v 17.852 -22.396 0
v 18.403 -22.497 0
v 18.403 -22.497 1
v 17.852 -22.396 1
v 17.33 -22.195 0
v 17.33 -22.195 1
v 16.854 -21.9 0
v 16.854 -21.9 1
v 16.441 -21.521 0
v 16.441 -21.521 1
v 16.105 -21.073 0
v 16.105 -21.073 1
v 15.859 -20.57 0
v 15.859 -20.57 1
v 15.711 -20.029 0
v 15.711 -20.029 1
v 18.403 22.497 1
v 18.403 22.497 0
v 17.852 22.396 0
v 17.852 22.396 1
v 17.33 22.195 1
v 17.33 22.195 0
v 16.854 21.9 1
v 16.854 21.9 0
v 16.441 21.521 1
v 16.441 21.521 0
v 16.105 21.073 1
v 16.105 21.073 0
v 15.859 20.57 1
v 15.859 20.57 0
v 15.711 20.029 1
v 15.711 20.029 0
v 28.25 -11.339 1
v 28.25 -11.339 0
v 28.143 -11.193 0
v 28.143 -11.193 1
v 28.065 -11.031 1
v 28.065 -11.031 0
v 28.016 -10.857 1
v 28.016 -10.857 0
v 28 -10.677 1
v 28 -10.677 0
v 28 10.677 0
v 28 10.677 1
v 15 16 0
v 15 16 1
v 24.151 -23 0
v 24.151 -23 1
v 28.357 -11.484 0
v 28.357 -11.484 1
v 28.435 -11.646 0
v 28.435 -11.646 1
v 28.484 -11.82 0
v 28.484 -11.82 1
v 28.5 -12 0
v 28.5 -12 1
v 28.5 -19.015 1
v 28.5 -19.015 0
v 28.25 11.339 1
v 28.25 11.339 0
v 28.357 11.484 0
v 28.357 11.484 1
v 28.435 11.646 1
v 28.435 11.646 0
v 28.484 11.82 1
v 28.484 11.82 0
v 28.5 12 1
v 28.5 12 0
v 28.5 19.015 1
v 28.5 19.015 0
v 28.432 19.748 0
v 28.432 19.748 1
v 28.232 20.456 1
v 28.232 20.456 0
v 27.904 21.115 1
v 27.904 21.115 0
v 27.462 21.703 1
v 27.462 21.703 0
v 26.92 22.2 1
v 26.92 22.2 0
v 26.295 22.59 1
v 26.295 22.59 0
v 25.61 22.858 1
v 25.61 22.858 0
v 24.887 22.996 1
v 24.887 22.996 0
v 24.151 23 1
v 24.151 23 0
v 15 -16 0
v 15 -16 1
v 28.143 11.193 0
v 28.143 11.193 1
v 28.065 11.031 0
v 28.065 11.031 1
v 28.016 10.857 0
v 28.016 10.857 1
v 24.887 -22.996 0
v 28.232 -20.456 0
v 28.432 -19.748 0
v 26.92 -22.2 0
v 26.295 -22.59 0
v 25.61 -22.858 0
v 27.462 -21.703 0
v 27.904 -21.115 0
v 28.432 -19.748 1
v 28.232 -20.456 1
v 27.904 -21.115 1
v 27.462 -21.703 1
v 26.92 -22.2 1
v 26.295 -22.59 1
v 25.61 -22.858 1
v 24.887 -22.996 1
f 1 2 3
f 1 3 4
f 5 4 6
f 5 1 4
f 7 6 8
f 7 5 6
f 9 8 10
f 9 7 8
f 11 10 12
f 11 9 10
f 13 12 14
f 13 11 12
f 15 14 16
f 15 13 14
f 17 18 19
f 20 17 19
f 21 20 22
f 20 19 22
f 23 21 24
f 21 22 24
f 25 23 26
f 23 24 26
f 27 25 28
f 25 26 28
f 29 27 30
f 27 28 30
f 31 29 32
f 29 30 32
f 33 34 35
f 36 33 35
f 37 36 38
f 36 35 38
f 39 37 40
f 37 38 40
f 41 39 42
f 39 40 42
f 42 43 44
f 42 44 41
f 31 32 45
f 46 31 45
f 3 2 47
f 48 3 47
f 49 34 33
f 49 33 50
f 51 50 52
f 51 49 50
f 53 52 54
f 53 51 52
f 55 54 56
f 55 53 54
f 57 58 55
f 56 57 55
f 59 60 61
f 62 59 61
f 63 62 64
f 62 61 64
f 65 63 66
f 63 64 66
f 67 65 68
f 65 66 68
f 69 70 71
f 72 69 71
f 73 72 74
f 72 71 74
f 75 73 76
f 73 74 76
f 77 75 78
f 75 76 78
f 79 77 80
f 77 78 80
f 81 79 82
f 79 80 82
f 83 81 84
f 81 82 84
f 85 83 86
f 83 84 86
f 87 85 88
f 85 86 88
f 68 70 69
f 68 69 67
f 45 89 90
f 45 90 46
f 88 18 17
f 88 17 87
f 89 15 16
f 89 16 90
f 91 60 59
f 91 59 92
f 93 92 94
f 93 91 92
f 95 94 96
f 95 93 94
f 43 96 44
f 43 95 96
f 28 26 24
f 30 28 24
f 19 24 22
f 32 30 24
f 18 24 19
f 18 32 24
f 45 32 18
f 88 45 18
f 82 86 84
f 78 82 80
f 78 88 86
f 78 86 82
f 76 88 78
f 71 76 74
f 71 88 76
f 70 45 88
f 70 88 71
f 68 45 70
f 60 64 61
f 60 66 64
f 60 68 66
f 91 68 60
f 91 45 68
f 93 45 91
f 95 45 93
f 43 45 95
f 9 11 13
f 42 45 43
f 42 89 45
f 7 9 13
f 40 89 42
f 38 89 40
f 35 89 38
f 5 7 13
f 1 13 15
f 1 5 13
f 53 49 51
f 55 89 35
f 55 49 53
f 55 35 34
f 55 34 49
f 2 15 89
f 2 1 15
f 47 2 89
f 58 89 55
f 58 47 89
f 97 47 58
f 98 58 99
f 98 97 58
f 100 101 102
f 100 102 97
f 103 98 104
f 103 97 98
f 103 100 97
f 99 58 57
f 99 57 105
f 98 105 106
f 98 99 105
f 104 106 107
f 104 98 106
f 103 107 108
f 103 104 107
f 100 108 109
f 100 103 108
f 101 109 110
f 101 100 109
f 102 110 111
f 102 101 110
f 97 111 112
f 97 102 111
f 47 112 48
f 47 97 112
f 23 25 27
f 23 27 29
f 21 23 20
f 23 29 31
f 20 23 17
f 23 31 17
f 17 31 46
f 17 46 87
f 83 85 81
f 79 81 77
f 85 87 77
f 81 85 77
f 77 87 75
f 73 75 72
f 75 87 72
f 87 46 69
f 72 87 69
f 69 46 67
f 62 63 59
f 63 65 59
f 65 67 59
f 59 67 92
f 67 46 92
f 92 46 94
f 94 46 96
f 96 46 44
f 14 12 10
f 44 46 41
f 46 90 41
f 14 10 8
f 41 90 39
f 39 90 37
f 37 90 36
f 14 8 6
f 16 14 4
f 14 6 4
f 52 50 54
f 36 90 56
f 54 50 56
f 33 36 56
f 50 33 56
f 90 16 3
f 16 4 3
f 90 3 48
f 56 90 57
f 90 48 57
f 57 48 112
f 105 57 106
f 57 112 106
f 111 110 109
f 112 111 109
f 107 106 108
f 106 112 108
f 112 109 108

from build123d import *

# Parameters (mm, degrees)
PAD_DEPTH = 1


with BuildPart() as part:
    # Sketch007 → Pad (new body)
    with BuildSketch(Plane.XY):
        with BuildLine():
            ThreePointArc((28.5, 19.015221), (27.202361, 21.964331), (24.151377, 23))
            Line((18.403463, 22.497123), (24.151377, 23))
            ThreePointArc((18.403463, 22.497123), (16.638159, 21.720371), (15.710507, 20.029483))
            Line((15.710507, 20.029483), (15, 16))
            Line((15, 16), (15, 0))
            Line((15, 0), (28, 0))
            Line((28, 0), (28, 10.677124))
            ThreePointArc((28.25, 11.338562), (28.064586, 11.030678), (28, 10.677124))
            ThreePointArc((28.25, 11.338562), (28.435414, 11.646447), (28.5, 12))
            Line((28.5, 19.015221), (28.5, 12))
        make_face()
    pad = extrude(amount=PAD_DEPTH)

    # Mirrored: Pad across Sketch007 H_Axis
    add(pad.mirror(Plane.ZX))


solid = part.part
